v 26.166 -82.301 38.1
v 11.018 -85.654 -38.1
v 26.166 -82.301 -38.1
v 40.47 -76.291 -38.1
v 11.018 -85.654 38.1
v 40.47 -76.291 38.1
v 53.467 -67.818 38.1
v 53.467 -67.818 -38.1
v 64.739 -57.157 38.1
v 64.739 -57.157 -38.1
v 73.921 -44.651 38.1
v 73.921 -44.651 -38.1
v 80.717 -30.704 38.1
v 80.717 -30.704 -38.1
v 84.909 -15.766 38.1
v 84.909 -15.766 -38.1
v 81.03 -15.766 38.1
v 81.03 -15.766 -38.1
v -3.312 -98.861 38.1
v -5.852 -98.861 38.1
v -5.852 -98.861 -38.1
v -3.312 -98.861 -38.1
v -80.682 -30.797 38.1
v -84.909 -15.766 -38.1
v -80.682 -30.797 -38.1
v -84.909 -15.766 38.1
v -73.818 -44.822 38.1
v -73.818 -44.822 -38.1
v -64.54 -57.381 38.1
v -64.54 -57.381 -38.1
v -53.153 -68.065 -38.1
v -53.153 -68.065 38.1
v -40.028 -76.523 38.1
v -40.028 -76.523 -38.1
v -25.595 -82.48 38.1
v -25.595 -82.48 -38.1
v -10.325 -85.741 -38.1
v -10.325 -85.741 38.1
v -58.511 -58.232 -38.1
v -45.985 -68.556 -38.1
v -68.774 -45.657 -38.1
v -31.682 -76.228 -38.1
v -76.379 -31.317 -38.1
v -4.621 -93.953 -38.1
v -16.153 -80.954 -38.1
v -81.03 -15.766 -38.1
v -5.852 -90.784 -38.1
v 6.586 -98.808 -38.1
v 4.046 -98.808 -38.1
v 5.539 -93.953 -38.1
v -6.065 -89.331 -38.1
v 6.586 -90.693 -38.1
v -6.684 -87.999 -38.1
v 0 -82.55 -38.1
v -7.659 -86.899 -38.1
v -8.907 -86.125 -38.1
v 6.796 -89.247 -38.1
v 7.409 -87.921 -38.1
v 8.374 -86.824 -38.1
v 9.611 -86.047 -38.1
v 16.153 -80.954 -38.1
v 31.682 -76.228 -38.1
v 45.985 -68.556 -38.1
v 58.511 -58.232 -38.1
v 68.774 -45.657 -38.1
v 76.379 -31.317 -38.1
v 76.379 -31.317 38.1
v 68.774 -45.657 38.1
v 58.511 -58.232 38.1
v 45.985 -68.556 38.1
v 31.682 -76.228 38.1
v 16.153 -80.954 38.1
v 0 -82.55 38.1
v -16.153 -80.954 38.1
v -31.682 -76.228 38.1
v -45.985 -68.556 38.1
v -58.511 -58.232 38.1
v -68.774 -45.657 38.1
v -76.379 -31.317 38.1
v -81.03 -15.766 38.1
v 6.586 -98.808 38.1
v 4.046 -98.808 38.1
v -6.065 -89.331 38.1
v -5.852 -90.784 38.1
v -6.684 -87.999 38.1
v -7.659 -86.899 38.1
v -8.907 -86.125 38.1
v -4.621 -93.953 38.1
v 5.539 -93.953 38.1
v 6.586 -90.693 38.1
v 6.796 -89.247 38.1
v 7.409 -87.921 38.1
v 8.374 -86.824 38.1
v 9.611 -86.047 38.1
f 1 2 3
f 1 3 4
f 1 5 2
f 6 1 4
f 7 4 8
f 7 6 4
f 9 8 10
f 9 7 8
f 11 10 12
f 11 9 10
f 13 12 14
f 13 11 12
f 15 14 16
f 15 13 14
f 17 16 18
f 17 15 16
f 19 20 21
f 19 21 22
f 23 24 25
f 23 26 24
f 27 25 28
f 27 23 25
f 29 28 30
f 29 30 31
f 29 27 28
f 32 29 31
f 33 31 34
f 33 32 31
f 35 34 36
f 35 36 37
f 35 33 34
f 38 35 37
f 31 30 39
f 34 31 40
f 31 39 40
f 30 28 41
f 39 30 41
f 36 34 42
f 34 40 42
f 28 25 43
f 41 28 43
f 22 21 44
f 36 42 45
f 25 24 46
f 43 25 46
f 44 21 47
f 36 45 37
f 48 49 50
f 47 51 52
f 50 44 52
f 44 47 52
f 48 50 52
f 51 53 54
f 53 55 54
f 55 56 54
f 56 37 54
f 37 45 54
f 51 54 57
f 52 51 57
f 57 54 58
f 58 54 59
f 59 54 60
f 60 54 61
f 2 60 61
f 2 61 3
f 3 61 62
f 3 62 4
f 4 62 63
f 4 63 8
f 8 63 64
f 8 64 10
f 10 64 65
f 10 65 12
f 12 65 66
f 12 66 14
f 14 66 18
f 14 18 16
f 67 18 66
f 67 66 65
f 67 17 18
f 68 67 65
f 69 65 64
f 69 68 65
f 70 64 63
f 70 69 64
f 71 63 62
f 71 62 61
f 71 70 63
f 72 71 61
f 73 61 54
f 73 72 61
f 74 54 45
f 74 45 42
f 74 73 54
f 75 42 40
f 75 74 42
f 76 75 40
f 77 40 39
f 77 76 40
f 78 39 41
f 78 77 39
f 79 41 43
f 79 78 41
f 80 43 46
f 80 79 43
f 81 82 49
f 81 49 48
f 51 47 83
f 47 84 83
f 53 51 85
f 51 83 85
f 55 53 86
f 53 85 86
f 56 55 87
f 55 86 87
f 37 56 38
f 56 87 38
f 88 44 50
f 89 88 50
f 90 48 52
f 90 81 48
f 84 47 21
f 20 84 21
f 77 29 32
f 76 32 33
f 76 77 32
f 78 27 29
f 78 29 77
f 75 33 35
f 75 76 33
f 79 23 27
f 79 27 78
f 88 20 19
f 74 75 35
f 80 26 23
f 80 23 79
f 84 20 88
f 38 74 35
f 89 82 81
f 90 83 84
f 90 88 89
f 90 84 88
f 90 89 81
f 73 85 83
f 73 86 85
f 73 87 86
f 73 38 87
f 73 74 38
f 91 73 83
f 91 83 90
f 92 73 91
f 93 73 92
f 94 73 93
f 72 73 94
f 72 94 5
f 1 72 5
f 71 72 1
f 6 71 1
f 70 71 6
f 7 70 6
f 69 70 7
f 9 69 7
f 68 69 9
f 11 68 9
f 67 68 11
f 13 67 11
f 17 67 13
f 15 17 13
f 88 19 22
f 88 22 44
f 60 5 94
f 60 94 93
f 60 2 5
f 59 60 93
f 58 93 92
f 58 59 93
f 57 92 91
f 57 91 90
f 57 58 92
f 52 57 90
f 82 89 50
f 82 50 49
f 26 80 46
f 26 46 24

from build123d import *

# Parameters (mm, degrees)
F1_DEPTH = 38.1
F2_R     = 5.08


with BuildPart() as f1:
    # F0 (on Top) → F1 (new body, symmetric)
    with BuildSketch(Plane.XY):
        with BuildLine():
            ThreePointArc((81.030455, -15.766034), (0, -82.55), (-81.030455, -15.766034))
            Line((-81.030455, -15.766034), (-84.908667, -15.766034))
            ThreePointArc((-84.908667, -15.766034), (-57.430588, -64.496335), (-5.852405, -86.16147))
            Line((-5.852405, -86.16147), (-5.852405, -98.86147))
            Line((-5.852405, -98.86147), (-3.312405, -98.86147))
            Line((-3.312405, -98.86147), (-4.620644, -93.952814))
            Line((-4.620644, -93.952814), (5.539356, -93.952814))
            Line((5.539356, -93.952814), (4.046382, -98.808473))
            Line((4.046382, -98.808473), (6.586382, -98.808473))
            Line((6.586382, -98.808473), (6.586382, -86.108473))
            ThreePointArc((6.586382, -86.108473), (57.704858, -64.251062), (84.908667, -15.766034))
            Line((84.908667, -15.766034), (81.030455, -15.766034))
        make_face()
    extrude(amount=F1_DEPTH, both=True)

    # F2
    f2_edges = [f1.edges().sort_by_distance(p)[0] for p in [
        (6.586382, -86.108473, 0),
        (-5.852405, -86.16147, 0),
    ]]
    fillet(f2_edges, radius=F2_R)


solid = f1.part
